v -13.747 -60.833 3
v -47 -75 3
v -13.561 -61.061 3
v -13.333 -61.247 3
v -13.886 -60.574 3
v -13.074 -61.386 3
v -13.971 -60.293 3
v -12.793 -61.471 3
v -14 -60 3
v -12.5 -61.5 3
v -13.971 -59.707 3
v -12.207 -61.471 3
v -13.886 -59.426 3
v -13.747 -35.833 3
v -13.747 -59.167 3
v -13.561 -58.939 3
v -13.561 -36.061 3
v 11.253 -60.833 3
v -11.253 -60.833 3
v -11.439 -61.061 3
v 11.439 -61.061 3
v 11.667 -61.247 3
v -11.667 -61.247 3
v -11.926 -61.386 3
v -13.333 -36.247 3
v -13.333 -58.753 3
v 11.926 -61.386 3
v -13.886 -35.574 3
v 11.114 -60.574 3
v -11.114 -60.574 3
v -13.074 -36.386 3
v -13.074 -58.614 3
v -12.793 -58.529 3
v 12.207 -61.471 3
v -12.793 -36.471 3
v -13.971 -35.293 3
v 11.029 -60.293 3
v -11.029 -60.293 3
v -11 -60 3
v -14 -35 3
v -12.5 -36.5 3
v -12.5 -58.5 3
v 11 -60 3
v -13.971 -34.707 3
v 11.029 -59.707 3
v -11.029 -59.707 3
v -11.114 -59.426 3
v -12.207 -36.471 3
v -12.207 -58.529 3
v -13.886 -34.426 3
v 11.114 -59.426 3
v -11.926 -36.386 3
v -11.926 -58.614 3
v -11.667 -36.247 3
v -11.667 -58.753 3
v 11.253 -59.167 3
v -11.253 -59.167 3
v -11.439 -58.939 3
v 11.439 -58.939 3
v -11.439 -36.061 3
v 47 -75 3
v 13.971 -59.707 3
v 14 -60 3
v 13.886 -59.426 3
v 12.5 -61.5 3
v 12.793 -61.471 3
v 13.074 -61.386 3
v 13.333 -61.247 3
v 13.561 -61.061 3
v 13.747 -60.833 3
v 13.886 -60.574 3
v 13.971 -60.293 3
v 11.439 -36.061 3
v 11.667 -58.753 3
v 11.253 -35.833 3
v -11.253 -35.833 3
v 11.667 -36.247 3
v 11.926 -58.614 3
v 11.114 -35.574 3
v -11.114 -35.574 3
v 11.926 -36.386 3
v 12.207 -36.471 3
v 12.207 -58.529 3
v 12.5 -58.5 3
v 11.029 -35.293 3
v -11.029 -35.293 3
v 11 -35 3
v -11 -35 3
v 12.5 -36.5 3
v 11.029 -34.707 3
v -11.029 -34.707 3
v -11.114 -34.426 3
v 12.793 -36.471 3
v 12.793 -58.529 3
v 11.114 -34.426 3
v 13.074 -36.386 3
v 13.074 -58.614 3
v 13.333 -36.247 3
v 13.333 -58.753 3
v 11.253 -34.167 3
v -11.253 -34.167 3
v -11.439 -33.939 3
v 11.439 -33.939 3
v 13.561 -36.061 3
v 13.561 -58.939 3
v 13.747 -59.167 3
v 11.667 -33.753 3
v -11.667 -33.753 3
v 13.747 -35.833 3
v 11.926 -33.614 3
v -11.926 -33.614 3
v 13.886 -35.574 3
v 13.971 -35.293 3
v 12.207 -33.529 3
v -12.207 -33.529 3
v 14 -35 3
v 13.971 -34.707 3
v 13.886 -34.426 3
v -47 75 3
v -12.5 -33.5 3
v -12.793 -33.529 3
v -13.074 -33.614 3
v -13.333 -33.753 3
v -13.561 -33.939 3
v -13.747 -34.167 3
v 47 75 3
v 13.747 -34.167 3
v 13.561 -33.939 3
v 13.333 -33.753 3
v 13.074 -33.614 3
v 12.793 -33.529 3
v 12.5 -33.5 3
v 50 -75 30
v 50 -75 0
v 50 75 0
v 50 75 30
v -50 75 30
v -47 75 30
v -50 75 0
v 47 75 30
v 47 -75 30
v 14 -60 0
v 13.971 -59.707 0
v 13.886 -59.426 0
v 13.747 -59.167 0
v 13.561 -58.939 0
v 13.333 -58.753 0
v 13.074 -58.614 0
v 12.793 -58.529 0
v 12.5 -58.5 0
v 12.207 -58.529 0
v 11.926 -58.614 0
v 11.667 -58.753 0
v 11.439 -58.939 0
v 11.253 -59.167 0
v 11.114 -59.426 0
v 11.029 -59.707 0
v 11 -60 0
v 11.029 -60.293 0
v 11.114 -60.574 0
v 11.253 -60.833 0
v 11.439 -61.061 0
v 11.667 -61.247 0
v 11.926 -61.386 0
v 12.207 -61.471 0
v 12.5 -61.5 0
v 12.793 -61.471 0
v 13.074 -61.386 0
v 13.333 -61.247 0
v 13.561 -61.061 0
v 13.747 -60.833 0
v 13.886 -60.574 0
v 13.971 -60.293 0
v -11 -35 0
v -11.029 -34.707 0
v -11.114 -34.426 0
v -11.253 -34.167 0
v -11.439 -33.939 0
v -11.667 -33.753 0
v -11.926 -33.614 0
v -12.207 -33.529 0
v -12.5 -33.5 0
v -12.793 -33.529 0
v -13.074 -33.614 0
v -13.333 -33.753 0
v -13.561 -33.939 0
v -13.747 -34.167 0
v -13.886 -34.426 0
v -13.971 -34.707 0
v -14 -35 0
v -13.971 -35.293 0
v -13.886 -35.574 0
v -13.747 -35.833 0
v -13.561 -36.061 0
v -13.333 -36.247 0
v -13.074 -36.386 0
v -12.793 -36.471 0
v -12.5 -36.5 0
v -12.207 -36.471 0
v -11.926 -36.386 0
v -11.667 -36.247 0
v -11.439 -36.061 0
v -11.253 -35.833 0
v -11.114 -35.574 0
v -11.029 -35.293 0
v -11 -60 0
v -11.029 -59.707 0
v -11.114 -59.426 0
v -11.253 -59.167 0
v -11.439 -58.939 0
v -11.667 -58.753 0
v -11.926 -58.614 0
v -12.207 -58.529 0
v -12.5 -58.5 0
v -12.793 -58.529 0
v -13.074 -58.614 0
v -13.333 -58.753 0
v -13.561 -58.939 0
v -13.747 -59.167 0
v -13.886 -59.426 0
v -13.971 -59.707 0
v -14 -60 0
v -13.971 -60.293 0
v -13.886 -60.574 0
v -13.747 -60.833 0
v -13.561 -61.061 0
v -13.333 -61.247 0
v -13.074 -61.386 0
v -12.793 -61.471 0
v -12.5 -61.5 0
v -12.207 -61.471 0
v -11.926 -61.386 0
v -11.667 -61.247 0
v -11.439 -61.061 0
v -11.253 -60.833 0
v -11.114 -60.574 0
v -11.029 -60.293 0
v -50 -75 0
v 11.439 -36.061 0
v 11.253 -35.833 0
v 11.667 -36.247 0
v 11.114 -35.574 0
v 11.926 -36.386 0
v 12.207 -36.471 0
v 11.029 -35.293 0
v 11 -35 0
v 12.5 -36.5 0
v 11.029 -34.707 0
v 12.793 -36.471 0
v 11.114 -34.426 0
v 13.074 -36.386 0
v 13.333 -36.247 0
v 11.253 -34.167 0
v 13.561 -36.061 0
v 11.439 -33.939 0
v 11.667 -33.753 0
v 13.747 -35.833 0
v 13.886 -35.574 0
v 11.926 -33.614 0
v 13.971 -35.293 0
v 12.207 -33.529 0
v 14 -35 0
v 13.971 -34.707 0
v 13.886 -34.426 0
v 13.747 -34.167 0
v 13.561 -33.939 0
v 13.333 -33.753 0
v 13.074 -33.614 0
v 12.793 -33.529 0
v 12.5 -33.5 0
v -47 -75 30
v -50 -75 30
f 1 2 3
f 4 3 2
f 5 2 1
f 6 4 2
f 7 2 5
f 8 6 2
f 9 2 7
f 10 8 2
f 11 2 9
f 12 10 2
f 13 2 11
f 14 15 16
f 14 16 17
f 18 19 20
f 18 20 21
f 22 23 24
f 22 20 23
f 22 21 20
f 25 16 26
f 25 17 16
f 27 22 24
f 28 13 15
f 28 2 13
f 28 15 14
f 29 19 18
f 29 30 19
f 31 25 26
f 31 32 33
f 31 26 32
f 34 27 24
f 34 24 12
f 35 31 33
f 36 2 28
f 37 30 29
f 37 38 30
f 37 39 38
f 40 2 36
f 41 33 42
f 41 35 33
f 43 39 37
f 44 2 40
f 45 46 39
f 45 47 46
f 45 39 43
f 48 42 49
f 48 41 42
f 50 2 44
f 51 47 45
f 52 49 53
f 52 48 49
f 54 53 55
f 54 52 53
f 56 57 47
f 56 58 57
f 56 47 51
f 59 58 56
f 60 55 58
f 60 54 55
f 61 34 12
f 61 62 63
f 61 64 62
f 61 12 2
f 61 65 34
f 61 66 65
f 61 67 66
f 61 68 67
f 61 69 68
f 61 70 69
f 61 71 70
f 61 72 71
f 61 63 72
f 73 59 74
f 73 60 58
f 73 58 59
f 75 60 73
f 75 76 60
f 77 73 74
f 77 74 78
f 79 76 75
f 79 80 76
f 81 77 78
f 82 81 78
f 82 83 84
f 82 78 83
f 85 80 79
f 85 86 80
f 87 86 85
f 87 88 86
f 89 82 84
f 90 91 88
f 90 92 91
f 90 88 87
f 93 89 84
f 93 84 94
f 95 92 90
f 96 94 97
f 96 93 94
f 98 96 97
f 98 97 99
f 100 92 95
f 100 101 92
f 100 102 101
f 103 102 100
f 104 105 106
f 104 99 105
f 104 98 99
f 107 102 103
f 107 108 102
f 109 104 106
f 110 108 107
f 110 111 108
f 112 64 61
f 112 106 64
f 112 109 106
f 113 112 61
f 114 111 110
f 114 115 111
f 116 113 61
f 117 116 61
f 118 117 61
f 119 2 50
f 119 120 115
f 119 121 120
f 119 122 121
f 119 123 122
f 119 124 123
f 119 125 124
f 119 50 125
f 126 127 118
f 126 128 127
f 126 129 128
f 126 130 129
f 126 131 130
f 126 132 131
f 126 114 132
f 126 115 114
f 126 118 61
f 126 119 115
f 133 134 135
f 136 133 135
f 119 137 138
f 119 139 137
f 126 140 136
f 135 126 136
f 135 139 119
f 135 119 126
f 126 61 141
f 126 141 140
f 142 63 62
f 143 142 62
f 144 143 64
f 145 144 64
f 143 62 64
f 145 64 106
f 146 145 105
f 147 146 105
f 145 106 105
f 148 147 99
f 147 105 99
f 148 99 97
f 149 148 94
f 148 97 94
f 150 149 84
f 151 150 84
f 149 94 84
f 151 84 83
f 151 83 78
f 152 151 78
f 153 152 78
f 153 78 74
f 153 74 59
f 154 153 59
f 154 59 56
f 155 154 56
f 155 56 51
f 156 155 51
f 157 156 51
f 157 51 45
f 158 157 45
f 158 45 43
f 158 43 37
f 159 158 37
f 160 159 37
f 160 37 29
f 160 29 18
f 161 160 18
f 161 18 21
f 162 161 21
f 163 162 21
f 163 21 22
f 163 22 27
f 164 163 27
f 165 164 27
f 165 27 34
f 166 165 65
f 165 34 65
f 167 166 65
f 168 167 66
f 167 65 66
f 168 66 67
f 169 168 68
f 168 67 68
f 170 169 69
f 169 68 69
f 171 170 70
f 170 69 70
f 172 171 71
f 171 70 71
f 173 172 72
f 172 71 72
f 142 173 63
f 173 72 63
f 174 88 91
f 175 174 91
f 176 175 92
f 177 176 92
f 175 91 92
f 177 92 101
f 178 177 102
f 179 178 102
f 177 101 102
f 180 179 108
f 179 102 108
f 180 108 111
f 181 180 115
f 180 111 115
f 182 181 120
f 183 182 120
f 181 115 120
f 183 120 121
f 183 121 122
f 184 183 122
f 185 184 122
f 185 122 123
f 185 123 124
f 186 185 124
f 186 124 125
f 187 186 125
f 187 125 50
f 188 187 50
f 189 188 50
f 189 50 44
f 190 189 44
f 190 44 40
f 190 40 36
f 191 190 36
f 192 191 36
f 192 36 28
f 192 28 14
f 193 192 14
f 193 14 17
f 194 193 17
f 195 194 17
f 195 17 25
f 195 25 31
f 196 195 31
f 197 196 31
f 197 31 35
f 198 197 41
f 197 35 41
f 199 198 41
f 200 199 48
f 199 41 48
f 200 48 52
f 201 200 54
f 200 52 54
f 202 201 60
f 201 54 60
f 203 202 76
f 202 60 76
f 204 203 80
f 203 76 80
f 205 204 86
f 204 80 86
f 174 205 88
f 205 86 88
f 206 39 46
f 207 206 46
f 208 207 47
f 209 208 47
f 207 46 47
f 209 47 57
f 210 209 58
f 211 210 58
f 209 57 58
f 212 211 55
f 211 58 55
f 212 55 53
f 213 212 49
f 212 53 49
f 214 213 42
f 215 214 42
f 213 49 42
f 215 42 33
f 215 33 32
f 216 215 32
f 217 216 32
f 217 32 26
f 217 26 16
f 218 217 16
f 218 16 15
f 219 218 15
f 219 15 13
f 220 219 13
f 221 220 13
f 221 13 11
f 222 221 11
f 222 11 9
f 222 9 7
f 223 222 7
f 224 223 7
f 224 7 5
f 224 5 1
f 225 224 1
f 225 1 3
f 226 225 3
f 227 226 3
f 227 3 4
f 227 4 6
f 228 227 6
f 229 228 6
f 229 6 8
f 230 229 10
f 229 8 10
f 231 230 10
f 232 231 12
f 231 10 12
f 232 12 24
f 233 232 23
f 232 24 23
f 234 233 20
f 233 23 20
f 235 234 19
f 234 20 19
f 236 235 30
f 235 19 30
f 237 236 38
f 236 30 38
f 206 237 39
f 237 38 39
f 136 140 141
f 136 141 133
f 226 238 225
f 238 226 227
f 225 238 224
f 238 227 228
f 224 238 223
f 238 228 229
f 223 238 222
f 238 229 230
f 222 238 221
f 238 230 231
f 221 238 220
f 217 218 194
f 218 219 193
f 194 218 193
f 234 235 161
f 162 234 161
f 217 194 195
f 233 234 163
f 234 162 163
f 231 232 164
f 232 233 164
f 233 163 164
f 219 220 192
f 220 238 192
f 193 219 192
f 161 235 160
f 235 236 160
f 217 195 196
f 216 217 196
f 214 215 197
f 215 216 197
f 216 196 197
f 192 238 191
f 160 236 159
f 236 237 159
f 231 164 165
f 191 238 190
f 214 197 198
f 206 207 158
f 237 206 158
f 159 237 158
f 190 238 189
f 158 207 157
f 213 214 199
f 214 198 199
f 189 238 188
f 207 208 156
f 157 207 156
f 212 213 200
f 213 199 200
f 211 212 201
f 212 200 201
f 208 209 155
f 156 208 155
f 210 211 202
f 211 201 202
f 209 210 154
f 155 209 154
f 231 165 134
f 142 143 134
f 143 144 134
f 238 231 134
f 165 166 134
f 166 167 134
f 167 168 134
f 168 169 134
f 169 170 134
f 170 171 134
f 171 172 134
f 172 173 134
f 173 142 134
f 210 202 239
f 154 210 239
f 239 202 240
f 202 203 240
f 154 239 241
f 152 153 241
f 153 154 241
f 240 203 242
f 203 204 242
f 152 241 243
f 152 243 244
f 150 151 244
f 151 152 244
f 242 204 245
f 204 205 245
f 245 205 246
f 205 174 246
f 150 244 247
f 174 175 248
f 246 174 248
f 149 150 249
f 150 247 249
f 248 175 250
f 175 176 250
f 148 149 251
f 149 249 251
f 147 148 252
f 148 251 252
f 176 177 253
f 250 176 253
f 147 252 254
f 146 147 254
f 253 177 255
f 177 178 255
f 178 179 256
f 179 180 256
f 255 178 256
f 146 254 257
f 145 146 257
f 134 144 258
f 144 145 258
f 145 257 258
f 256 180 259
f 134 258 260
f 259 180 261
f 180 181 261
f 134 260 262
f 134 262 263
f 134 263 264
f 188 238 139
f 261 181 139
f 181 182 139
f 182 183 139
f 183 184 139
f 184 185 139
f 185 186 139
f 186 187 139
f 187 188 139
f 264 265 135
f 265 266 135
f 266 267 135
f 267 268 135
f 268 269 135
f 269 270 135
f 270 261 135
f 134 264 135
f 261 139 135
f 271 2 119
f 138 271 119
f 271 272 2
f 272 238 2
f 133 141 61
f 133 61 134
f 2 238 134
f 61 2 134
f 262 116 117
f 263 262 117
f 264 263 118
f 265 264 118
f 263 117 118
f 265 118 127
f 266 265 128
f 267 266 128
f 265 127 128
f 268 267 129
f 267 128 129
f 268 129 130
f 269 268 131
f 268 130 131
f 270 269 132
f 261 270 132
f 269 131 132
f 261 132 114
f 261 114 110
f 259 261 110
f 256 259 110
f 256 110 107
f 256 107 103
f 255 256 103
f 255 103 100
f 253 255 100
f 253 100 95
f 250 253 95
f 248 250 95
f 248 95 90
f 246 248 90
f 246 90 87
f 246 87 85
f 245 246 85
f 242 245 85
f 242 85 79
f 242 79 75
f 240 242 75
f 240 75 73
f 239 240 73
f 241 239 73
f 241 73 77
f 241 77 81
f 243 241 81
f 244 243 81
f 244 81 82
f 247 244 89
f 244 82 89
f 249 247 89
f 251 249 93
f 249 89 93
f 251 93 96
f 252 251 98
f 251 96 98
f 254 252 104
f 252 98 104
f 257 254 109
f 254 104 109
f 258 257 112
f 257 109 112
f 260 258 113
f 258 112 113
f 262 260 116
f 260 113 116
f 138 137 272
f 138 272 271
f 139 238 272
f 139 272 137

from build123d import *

# Parameters (mm, degrees)
SKETCH1_W           = 100
SKETCH1_H           = 150
BOSS_EXTRUDE1_DEPTH = 30
SHELL1_T            = -3
CUT_EXTRUDE2_REACH  = 96.096
SKETCH2_R           = 1.5


with BuildPart() as part:
    # Sketch1 → Boss-Extrude1 (new body)
    with BuildSketch(Plane.XY):
        Rectangle(SKETCH1_W, SKETCH1_H)
    extrude(amount=BOSS_EXTRUDE1_DEPTH)

    # Shell1
    shell1_openings = [part.faces().sort_by_distance(p)[0] for p in [
        (0, 0, 30),
        (0, 75, 15),
        (0, -75, 15),
    ]]
    offset(amount=SHELL1_T, openings=shell1_openings, kind=Kind.INTERSECTION)

    # Sketch2 → Cut-Extrude2 (cut, up to next)
    with BuildSketch(Plane.XY.offset(3), mode=Mode.PRIVATE) as cut_extrude2_sk1:
        with Locations((-12.5, -35)):
            Circle(SKETCH2_R)
    cut_extrude2_tool1 = extrude(cut_extrude2_sk1.sketch, amount=-CUT_EXTRUDE2_REACH, mode=Mode.PRIVATE) & part.part
    # Sketch2 → Cut-Extrude2 (cut, up to next)
    with BuildSketch(Plane.XY.offset(3), mode=Mode.PRIVATE) as cut_extrude2_sk2:
        with Locations((-12.5, -60)):
            Circle(SKETCH2_R)
    cut_extrude2_tool2 = extrude(cut_extrude2_sk2.sketch, amount=-CUT_EXTRUDE2_REACH, mode=Mode.PRIVATE) & part.part
    # Sketch2 → Cut-Extrude2 (cut, up to next)
    with BuildSketch(Plane.XY.offset(3), mode=Mode.PRIVATE) as cut_extrude2_sk3:
        with Locations((12.5, -60)):
            Circle(SKETCH2_R)
    cut_extrude2_tool3 = extrude(cut_extrude2_sk3.sketch, amount=-CUT_EXTRUDE2_REACH, mode=Mode.PRIVATE) & part.part
    # Sketch2 → Cut-Extrude2 (cut, up to next)
    with BuildSketch(Plane.XY.offset(3), mode=Mode.PRIVATE) as cut_extrude2_sk4:
        with Locations((12.5, -35)):
            Circle(SKETCH2_R)
    cut_extrude2_tool4 = extrude(cut_extrude2_sk4.sketch, amount=-CUT_EXTRUDE2_REACH, mode=Mode.PRIVATE) & part.part
    add(cut_extrude2_tool1.solids().sort_by_distance((-12.5, -35, 3))[0], mode=Mode.SUBTRACT)
    add(cut_extrude2_tool2.solids().sort_by_distance((-12.5, -60, 3))[0], mode=Mode.SUBTRACT)
    add(cut_extrude2_tool3.solids().sort_by_distance((12.5, -60, 3))[0], mode=Mode.SUBTRACT)
    add(cut_extrude2_tool4.solids().sort_by_distance((12.5, -35, 3))[0], mode=Mode.SUBTRACT)


solid = part.part
